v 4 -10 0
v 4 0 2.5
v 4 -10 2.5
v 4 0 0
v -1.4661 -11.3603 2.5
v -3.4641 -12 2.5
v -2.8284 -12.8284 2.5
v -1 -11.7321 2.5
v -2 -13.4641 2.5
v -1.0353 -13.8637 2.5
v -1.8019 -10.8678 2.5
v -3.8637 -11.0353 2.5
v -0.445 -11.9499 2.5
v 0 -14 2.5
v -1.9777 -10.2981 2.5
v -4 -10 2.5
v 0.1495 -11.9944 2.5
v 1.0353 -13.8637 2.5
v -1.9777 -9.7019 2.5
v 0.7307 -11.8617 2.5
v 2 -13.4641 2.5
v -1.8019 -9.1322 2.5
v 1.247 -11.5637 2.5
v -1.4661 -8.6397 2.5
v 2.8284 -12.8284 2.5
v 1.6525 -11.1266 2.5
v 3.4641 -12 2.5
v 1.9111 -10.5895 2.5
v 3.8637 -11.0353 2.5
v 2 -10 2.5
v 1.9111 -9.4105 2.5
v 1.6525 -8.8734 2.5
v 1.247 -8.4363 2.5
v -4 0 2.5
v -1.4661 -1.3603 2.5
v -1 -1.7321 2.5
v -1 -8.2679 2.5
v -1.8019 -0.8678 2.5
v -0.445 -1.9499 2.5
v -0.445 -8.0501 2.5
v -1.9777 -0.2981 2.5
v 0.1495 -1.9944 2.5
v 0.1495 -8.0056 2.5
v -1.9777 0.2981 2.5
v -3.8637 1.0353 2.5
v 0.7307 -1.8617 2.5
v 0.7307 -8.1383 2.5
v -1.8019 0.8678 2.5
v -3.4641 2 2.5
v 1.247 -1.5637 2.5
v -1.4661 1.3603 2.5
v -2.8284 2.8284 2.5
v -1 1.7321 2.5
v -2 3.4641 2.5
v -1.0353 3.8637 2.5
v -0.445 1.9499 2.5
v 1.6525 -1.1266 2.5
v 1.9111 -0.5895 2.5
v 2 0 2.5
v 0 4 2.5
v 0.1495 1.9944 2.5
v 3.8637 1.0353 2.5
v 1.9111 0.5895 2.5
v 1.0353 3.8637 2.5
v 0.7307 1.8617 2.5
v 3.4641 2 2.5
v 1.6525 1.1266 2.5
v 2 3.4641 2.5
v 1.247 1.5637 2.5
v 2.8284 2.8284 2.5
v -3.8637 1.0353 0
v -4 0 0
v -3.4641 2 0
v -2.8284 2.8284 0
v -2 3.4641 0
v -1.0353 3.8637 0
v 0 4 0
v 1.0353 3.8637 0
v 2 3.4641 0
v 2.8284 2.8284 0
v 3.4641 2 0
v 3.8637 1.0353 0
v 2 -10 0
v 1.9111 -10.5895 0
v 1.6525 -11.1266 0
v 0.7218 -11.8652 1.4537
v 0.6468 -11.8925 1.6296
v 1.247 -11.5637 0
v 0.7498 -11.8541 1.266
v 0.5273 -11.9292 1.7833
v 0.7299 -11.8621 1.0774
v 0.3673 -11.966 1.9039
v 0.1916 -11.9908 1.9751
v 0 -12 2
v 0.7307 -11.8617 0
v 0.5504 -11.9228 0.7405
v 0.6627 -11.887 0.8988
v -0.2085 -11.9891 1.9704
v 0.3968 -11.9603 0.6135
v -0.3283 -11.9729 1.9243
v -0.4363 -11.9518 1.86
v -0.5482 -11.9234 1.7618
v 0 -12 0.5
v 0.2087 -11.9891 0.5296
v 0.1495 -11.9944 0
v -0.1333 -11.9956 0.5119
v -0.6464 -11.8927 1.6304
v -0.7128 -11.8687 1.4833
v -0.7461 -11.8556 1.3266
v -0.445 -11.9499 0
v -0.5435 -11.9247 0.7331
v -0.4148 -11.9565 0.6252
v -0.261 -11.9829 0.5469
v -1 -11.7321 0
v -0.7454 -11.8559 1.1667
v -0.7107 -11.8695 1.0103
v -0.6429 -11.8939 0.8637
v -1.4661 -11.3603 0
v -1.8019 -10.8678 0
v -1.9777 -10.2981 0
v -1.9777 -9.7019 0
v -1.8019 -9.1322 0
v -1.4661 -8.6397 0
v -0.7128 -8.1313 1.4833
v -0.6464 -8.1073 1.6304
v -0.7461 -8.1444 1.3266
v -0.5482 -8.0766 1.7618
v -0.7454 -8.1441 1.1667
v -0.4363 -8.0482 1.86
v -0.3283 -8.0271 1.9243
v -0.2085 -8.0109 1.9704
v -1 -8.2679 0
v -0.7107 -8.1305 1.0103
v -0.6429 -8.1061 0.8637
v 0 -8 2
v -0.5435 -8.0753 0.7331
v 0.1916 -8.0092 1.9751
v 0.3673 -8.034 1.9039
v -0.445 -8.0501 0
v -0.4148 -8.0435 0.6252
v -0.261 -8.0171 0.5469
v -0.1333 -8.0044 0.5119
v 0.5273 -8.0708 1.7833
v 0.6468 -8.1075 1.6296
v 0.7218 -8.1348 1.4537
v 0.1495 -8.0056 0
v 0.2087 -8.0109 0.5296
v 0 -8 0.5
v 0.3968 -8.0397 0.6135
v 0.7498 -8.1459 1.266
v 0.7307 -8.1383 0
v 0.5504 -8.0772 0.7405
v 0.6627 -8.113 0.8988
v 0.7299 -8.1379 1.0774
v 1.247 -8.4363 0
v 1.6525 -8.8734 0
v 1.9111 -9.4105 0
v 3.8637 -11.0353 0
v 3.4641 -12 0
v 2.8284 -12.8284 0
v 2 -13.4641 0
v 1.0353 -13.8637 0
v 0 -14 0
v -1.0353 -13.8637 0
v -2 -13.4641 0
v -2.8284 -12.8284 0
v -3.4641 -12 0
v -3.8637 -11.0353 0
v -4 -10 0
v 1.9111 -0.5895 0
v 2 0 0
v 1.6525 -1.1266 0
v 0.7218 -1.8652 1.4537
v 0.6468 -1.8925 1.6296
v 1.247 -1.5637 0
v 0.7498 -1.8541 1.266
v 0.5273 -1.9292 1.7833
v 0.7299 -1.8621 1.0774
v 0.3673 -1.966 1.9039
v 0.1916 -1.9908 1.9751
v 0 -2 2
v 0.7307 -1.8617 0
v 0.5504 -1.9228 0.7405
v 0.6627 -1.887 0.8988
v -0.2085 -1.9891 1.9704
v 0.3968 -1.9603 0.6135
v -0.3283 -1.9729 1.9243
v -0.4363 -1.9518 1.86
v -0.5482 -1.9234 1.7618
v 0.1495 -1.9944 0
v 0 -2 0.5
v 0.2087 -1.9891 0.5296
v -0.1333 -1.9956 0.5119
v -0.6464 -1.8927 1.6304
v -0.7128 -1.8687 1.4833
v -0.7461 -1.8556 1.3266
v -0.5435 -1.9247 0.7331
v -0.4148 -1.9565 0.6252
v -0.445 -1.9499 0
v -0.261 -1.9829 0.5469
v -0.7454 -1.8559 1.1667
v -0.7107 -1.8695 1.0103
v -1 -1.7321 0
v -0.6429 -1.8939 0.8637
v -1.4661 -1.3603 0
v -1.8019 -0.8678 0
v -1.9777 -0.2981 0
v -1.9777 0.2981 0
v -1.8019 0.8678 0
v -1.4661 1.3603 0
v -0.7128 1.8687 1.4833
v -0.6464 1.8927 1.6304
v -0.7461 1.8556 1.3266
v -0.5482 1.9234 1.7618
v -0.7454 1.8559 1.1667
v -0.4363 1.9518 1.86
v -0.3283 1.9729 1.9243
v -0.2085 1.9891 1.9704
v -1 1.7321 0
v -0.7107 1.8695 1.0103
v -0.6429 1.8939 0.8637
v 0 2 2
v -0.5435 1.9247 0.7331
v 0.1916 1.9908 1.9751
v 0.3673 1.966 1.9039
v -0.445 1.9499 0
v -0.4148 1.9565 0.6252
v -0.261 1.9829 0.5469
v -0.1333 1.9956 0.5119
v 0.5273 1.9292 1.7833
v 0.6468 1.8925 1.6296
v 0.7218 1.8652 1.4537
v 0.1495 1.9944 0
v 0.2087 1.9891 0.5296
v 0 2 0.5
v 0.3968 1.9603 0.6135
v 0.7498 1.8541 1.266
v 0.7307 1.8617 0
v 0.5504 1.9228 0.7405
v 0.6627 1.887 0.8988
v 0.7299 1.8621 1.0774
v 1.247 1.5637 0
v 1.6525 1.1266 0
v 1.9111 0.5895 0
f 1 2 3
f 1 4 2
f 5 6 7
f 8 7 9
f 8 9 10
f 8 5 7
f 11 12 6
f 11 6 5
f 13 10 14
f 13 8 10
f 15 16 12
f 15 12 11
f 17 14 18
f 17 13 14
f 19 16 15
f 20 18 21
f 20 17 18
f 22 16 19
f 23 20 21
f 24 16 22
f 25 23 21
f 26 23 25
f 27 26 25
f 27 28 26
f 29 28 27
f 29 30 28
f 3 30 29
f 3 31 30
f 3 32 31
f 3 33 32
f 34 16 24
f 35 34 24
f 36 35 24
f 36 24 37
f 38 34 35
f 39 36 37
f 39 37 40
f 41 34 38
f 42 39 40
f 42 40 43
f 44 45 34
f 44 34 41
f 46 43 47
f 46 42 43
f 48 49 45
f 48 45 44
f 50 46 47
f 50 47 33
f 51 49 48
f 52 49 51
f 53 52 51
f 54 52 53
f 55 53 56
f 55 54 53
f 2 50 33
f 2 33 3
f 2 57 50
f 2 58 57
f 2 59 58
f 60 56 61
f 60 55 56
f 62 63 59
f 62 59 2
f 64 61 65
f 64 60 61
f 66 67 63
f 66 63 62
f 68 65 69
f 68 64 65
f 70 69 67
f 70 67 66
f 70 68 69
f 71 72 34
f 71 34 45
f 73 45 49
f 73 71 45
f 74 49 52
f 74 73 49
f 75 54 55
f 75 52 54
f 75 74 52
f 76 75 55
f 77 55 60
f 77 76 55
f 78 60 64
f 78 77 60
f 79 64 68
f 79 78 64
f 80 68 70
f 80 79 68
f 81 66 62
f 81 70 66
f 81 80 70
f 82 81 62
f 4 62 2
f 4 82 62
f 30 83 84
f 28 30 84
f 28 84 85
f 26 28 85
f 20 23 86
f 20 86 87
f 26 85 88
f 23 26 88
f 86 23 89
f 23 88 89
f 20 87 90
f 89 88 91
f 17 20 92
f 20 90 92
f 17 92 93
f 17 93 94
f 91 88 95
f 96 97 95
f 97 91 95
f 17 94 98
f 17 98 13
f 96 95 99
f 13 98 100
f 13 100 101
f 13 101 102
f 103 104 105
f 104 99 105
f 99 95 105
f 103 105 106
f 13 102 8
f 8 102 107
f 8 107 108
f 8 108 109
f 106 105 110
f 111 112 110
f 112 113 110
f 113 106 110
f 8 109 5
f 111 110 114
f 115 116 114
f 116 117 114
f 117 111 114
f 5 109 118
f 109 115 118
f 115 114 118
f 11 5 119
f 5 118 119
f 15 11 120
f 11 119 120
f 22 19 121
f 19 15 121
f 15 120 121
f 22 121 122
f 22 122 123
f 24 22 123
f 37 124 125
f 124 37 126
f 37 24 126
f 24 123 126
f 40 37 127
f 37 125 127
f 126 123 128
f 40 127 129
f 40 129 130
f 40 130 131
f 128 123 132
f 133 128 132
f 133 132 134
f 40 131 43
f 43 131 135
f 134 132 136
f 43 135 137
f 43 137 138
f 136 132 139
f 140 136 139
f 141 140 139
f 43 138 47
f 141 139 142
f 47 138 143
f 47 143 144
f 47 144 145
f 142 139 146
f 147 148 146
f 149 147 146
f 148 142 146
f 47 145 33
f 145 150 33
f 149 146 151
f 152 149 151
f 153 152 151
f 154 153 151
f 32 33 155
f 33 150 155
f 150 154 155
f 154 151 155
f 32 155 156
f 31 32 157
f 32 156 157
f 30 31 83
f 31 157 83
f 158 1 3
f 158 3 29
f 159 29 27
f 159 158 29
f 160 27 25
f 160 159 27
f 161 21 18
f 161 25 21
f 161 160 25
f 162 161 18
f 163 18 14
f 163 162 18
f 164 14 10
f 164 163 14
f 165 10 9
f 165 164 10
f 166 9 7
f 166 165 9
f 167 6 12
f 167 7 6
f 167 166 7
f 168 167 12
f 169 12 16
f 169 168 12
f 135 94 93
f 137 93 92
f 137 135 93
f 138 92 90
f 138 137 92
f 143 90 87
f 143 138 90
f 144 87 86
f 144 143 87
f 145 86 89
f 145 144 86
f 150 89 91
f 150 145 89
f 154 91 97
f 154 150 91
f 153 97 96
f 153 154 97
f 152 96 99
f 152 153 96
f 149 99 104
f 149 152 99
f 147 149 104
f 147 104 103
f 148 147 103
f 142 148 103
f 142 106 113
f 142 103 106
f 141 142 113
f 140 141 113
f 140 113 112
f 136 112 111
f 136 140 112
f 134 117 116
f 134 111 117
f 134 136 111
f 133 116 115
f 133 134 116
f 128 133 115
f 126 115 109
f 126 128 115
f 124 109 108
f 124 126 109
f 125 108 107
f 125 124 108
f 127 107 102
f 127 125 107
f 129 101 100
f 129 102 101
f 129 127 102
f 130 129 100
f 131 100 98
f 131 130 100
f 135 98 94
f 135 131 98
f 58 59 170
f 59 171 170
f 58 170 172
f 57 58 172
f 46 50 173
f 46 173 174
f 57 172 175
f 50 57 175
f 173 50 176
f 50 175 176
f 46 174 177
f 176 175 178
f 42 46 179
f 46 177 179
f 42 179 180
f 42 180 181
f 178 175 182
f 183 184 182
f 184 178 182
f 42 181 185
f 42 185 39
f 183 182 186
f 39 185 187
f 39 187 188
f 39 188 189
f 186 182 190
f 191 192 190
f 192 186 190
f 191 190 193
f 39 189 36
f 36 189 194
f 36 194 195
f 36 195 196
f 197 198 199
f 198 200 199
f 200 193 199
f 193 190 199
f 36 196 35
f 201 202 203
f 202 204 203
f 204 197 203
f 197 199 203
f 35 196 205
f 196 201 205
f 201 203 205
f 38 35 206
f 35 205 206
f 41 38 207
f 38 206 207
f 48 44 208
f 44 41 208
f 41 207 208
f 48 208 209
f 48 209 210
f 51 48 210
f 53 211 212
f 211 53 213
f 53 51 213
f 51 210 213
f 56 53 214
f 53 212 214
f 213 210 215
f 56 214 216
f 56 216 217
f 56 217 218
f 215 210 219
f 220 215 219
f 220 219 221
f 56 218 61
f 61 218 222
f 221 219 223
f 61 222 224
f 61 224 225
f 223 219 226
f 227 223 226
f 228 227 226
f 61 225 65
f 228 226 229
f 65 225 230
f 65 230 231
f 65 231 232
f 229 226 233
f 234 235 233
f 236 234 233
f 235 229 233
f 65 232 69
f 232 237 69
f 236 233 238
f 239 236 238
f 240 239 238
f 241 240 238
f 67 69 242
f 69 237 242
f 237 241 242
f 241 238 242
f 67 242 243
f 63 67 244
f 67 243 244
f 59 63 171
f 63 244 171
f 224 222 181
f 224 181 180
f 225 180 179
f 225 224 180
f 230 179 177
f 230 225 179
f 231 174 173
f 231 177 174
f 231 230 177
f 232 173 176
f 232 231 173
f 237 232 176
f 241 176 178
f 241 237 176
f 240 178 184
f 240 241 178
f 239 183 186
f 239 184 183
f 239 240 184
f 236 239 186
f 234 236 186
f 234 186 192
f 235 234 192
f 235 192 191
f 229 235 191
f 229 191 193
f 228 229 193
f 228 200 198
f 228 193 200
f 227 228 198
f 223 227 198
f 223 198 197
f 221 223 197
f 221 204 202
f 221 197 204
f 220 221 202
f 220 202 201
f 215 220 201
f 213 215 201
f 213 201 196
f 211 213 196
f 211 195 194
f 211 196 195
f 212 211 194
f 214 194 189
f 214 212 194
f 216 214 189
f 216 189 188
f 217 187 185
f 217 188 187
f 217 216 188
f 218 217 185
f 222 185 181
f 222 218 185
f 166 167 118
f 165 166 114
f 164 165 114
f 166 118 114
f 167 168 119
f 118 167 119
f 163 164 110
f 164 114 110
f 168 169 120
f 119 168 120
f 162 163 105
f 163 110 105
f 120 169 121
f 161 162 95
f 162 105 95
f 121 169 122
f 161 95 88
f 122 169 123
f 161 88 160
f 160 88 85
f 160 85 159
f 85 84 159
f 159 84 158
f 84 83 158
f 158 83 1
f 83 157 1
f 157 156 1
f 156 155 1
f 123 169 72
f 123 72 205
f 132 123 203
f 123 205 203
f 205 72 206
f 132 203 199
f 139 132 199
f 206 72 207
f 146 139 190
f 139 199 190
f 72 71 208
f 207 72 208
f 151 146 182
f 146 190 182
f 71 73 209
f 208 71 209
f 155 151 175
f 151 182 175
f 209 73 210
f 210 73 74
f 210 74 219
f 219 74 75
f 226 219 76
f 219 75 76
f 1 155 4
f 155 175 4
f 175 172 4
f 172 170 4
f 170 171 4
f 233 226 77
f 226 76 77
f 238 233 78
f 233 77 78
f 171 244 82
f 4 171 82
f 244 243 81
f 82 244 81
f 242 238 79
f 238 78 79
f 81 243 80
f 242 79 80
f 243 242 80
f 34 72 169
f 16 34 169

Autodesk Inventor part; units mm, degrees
ref_plane "YZ Plane" through (0, 0, 0) normal (1, 0, 0) x (0, 1, 0)
ref_plane "XZ Plane" through (0, 0, 0) normal (0, 1, 0) x (-1, 0, 0)
ref_plane "XY Plane" through (0, 0, 0) normal (0, 0, 1) x (1, 0, 0)
sketch "Sketch1" plane through (0, 0, 0) normal (0, 0, 1) x (1, 0, 0)
  arc A0 (4, 0) -> (-4, 0) centre (0, 0) ccw
  line L0 (0, 0) -> (0, -10) construction
  line L1 (-4, 0) -> (-4, -10)
  line L2 (4, 0) -> (4, -10)
  arc A1 (-4, -10) -> (4, -10) centre (0, -10) ccw
  circle A2 centre (0, 0) radius 2
  circle A3 centre (0, -10) radius 2
  dimension "d0" = 8
  dimension "d2" = 8
  dimension "d3" = 10
  dimension "d4" = 4
  dimension "d5" = 4
extrude "Extrusion1" add sketch "Sketch1" along normal blind 2.5
sketch "Sketch4" plane through (0, 0, 0) normal (1, 0, 0) x (0, 1, 0)
  line L0 (2, 2.5) -> (2, 0) projected
  line L1 (-2, 2.5) -> (-2, 0) projected
  line L2 (2, 1.25) -> (-2, 1.25)
  line L3 (-2, 1.25) -> (-2, 2)
  line L4 (-2, 2) -> (2, 2)
  line L5 (2, 2) -> (2, 1.25)
  point P0 (0, 0)
  dimension "d14" = 1.5
revolve "Revolution1" add sketch "Sketch4" angle 360 about axis through (0, 2, 1.25) along (0, -1, 0)
sketch "Sketch5" plane through (0, 0, 0) normal (1, 0, 0) x (0, 1, 0)
  line L0 (-8, 2.5) -> (-8, 0) projected
  line L1 (-12, 2.5) -> (-12, 0) projected
  line L2 (-8, 1.25) -> (-12, 1.25)
  line L3 (-12, 1.25) -> (-12, 2)
  line L4 (-12, 2) -> (-8, 2)
  line L5 (-8, 2) -> (-8, 1.25)
  point P0 (0, 0)
  dimension "d16" = 1.5
revolve "Revolution2" add sketch "Sketch5" angle 360 about axis through (0, -8, 1.25) along (0, -1, 0)
properties part number "1-16"
